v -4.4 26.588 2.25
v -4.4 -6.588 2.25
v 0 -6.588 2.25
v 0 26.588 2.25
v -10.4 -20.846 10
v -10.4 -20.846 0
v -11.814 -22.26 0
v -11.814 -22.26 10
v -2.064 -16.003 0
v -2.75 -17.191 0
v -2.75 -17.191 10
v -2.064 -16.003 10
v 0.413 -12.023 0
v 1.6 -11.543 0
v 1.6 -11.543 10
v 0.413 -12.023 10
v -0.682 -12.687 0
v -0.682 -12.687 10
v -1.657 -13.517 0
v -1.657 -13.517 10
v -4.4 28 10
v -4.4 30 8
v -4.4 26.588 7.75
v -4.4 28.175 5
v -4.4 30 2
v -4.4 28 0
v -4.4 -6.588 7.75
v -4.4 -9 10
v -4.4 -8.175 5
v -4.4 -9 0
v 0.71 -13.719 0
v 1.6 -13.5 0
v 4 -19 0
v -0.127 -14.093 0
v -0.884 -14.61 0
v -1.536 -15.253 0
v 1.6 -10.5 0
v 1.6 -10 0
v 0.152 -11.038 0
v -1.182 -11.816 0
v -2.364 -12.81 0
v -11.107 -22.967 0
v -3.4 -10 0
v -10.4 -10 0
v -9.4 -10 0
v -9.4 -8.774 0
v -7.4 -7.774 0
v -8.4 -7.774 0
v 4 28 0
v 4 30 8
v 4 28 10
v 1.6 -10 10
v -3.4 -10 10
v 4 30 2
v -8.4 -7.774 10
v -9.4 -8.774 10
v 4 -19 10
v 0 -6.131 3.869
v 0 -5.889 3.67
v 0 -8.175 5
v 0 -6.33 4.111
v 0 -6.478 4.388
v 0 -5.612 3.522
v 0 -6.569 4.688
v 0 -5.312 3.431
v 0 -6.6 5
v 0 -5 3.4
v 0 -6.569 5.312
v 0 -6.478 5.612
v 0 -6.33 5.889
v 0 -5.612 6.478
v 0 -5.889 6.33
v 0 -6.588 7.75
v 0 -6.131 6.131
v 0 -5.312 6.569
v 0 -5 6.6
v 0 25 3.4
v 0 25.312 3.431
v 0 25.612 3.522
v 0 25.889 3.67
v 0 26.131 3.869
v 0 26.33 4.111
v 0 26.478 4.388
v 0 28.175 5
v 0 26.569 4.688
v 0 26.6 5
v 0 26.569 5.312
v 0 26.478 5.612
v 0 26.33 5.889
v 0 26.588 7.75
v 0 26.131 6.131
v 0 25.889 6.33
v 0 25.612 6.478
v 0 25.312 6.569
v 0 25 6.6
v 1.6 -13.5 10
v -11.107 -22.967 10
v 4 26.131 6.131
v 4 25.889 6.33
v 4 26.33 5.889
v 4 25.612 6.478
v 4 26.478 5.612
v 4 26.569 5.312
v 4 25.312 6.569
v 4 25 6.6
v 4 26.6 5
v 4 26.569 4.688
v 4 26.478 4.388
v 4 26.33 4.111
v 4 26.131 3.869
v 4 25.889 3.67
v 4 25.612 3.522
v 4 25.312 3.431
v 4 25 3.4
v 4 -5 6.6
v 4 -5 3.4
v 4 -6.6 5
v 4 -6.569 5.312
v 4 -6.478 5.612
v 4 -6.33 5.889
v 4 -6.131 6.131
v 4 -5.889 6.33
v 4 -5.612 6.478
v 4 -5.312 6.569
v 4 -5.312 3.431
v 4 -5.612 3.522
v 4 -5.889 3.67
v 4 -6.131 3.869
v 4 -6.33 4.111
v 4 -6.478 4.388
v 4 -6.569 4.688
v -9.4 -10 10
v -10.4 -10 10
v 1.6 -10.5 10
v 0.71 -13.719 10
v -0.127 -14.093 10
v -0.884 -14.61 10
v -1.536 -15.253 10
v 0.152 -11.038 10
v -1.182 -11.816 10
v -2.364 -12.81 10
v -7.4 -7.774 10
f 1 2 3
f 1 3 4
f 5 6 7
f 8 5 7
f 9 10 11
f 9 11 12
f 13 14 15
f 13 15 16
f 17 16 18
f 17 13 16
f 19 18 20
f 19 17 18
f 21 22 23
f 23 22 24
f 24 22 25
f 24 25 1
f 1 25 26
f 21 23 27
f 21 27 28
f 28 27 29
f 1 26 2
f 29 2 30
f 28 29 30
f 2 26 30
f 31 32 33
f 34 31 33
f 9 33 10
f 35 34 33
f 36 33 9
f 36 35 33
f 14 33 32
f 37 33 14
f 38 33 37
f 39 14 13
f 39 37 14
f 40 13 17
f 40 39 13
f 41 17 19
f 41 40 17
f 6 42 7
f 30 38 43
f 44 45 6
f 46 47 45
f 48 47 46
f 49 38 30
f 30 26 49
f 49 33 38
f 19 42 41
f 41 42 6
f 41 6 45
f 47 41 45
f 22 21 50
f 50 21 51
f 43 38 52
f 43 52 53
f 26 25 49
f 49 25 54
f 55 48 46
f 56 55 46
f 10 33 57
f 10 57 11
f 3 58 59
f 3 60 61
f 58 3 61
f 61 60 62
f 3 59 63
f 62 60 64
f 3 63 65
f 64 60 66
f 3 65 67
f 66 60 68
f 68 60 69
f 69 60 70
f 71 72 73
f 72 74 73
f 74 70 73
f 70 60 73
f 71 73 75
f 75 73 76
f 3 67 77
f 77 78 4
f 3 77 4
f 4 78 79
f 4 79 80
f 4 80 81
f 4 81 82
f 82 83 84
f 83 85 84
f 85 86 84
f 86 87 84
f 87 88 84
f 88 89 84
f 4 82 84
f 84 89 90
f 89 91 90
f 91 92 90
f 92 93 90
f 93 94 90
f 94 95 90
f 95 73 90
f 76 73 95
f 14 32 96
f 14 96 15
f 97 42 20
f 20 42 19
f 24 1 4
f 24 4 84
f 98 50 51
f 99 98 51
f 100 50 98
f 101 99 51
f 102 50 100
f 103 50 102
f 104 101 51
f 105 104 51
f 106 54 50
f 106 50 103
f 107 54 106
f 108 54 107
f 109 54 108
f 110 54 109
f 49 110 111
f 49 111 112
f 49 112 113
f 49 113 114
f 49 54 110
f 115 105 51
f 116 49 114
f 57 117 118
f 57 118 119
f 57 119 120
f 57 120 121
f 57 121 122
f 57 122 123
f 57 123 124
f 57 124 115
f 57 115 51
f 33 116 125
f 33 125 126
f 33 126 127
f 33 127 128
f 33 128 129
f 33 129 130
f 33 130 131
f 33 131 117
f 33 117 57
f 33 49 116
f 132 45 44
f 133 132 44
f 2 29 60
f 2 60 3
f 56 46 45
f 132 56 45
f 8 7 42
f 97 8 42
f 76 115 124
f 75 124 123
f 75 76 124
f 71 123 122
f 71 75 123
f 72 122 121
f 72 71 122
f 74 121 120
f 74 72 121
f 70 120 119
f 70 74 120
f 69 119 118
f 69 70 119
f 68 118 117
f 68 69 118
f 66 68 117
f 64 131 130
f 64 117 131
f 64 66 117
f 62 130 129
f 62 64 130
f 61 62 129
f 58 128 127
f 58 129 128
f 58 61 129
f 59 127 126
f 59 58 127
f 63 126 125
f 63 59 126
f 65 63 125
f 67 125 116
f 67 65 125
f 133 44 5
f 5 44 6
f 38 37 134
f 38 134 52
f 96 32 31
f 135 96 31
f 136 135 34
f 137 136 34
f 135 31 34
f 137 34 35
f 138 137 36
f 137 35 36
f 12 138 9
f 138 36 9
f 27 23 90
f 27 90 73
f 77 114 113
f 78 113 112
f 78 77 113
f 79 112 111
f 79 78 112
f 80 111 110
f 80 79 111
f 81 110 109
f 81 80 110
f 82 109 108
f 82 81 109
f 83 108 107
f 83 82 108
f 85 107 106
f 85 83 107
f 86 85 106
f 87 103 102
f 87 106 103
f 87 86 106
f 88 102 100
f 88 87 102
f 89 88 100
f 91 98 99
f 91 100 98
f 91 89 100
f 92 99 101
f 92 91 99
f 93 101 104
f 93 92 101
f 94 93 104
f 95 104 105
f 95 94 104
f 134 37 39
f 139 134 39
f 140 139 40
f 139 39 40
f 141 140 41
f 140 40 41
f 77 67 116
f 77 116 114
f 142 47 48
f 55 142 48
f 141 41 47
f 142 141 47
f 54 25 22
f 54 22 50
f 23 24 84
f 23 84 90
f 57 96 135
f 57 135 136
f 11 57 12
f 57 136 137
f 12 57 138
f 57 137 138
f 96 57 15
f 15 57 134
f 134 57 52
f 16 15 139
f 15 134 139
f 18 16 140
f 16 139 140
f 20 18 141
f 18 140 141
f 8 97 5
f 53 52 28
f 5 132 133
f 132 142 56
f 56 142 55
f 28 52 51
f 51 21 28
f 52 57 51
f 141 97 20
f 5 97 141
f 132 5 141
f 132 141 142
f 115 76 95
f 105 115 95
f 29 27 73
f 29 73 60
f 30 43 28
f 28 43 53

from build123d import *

# Parameters (mm, degrees)
PAD_DEPTH       = 10
POCKET_DEPTH    = 5
CHAMFER_SIZE    = 1
POCKET001_DEPTH = 4.4
CHAMFER001_SIZE = 2


with BuildPart() as part:
    # Sketch → Pad (new body)
    with BuildSketch(Plane.XY):
        with BuildLine():
            Line((0, 30), (4, 30))
            Line((4, 30), (4, 0))
            Line((4, 0), (4, -19))
            Line((4, -19), (-2.75, -17.191343))
            Line((-2.75, -17.191343), (-2.063716, -16.002664))
            ThreePointArc((1.6, -13.5), (-0.51688, -14.334081), (-2.063716, -16.002664))
            Line((1.6, -13.5), (1.6, -11.542586))
            ThreePointArc((1.6, -11.542586), (-0.147655, -12.333269), (-1.656853, -13.517244))
            Line((-11.107107, -22.967498), (-1.656853, -13.517244))
            Line((-11.814214, -22.260391), (-11.107107, -22.967498))
            Line((-10.4, -20.846177), (-11.814214, -22.260391))
            Line((-10.4, -10), (-10.4, -20.846177))
            Line((-9.4, -10), (-10.4, -10))
            Line((-9.4, -8.774099), (-9.4, -10))
            Line((-8.4, -7.774099), (-9.4, -8.774099))
            Line((-7.4, -7.774099), (-8.4, -7.774099))
            Line((-2.363961, -12.810138), (-7.4, -7.774099))
            ThreePointArc((1.6, -10.5), (-0.53166, -11.398235), (-2.363961, -12.810138))
            Line((1.6, -10.5), (1.6, -10))
            Line((1.6, -10), (-4.4, -10))
            Line((-4.4, 0), (-4.4, -10))
            Line((-4.4, 0), (-4.4, 30))
            Line((-4.4, 30), (0, 30))
        make_face()
    extrude(amount=PAD_DEPTH)

    # Sketch001 → Pocket (cut)
    with BuildSketch(Plane.YZ):
        with BuildLine():
            ThreePointArc((-5, 6.6), (-6.6, 5), (-5, 3.4))
            Line((-5, 3.4), (25, 3.4))
            ThreePointArc((25, 3.4), (26.6, 5), (25, 6.6))
            Line((-5, 6.6), (25, 6.6))
        make_face()
    extrude(amount=POCKET_DEPTH, mode=Mode.SUBTRACT)

    # Chamfer
    chamfer_edges = [part.edges().sort_by_distance(p)[0] for p in [
        (-4.4, -10, 5),
    ]]
    chamfer(chamfer_edges, length=CHAMFER_SIZE)

    # Sketch002 (on DatumPlane) → Pocket001 (cut)
    with BuildSketch(Plane(origin=(-4.4, 0, 0), x_dir=(0, -1, 0), z_dir=(-1, 0, 0))):
        Polygon((6.587713, 7.75), (8.175426, 5), (6.587713, 2.25), (-26.587713, 2.25), (-28.175426, 5), (-26.587713, 7.75), align=None)
    extrude(amount=-POCKET001_DEPTH, mode=Mode.SUBTRACT)

    # Chamfer001
    chamfer001_edges = [part.edges().sort_by_distance(p)[0] for p in [
        (-2.2, 30, 10),
        (-2.2, 30, 0),
    ]]
    chamfer(chamfer001_edges, length=CHAMFER001_SIZE)


solid = part.part
